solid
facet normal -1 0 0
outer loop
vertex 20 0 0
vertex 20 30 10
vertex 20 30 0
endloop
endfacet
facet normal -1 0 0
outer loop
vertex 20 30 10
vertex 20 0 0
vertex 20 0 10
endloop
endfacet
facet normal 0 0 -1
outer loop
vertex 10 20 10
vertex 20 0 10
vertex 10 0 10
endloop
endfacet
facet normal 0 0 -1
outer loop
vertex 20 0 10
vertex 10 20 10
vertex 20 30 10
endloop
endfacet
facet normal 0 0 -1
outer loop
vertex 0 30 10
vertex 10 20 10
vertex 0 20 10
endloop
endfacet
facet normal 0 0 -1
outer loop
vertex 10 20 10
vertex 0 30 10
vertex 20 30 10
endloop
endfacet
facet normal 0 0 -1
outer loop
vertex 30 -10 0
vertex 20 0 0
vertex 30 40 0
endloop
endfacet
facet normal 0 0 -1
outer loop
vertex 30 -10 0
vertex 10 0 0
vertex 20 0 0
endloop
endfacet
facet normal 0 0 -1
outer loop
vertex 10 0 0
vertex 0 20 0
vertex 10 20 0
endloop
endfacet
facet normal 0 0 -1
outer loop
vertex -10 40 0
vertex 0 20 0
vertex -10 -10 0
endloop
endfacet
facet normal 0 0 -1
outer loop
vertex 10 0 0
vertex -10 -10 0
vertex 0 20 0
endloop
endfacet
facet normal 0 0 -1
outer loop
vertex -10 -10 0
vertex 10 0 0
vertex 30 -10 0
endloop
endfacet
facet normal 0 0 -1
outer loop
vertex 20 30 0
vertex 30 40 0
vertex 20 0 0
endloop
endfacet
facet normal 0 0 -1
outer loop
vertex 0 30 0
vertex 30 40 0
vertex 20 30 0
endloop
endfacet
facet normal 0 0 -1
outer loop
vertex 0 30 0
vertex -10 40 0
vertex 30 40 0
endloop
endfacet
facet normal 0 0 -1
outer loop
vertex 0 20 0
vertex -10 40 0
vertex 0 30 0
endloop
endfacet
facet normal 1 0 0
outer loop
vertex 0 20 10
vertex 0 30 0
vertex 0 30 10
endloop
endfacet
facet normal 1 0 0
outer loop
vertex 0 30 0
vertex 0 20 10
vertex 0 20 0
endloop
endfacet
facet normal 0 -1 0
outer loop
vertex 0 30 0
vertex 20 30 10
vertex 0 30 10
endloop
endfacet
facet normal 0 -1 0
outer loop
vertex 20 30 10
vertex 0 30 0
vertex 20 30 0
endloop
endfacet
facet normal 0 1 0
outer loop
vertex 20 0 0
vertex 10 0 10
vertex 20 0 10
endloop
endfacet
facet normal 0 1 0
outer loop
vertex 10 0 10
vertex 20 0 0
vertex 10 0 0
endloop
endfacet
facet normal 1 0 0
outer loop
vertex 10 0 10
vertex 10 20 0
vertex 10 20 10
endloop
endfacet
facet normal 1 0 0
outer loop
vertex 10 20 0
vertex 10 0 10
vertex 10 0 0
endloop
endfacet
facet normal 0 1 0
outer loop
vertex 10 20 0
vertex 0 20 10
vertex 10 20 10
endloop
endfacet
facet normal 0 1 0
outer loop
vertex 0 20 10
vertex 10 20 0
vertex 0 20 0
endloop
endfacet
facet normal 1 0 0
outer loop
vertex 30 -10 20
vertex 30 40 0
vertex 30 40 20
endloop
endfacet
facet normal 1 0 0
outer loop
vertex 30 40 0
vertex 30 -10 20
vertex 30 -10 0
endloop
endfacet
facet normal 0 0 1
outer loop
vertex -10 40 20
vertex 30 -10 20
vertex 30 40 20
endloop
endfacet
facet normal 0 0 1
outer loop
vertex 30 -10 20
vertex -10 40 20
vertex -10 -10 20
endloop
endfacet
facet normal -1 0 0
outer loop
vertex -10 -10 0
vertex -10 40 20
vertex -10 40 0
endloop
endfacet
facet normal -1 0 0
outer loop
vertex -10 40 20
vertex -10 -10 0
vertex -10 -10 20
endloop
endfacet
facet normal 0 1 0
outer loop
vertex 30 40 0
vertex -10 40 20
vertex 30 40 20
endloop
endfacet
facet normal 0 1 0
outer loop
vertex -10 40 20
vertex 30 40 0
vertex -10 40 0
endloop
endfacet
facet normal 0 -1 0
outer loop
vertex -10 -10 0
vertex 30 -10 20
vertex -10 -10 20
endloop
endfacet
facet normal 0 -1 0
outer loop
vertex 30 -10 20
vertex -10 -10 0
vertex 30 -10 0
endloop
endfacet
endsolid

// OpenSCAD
module L_shape() {
  difference() {
    cube([20, 30, 10]);
    cube([20, 40, 40], center = true);
  }
}

module L_shape_container() {
  difference() {
    translate([-10, -10, 0])
    cube([40, 50, 20]);
    L_shape();
  }
}

L_shape_container();
